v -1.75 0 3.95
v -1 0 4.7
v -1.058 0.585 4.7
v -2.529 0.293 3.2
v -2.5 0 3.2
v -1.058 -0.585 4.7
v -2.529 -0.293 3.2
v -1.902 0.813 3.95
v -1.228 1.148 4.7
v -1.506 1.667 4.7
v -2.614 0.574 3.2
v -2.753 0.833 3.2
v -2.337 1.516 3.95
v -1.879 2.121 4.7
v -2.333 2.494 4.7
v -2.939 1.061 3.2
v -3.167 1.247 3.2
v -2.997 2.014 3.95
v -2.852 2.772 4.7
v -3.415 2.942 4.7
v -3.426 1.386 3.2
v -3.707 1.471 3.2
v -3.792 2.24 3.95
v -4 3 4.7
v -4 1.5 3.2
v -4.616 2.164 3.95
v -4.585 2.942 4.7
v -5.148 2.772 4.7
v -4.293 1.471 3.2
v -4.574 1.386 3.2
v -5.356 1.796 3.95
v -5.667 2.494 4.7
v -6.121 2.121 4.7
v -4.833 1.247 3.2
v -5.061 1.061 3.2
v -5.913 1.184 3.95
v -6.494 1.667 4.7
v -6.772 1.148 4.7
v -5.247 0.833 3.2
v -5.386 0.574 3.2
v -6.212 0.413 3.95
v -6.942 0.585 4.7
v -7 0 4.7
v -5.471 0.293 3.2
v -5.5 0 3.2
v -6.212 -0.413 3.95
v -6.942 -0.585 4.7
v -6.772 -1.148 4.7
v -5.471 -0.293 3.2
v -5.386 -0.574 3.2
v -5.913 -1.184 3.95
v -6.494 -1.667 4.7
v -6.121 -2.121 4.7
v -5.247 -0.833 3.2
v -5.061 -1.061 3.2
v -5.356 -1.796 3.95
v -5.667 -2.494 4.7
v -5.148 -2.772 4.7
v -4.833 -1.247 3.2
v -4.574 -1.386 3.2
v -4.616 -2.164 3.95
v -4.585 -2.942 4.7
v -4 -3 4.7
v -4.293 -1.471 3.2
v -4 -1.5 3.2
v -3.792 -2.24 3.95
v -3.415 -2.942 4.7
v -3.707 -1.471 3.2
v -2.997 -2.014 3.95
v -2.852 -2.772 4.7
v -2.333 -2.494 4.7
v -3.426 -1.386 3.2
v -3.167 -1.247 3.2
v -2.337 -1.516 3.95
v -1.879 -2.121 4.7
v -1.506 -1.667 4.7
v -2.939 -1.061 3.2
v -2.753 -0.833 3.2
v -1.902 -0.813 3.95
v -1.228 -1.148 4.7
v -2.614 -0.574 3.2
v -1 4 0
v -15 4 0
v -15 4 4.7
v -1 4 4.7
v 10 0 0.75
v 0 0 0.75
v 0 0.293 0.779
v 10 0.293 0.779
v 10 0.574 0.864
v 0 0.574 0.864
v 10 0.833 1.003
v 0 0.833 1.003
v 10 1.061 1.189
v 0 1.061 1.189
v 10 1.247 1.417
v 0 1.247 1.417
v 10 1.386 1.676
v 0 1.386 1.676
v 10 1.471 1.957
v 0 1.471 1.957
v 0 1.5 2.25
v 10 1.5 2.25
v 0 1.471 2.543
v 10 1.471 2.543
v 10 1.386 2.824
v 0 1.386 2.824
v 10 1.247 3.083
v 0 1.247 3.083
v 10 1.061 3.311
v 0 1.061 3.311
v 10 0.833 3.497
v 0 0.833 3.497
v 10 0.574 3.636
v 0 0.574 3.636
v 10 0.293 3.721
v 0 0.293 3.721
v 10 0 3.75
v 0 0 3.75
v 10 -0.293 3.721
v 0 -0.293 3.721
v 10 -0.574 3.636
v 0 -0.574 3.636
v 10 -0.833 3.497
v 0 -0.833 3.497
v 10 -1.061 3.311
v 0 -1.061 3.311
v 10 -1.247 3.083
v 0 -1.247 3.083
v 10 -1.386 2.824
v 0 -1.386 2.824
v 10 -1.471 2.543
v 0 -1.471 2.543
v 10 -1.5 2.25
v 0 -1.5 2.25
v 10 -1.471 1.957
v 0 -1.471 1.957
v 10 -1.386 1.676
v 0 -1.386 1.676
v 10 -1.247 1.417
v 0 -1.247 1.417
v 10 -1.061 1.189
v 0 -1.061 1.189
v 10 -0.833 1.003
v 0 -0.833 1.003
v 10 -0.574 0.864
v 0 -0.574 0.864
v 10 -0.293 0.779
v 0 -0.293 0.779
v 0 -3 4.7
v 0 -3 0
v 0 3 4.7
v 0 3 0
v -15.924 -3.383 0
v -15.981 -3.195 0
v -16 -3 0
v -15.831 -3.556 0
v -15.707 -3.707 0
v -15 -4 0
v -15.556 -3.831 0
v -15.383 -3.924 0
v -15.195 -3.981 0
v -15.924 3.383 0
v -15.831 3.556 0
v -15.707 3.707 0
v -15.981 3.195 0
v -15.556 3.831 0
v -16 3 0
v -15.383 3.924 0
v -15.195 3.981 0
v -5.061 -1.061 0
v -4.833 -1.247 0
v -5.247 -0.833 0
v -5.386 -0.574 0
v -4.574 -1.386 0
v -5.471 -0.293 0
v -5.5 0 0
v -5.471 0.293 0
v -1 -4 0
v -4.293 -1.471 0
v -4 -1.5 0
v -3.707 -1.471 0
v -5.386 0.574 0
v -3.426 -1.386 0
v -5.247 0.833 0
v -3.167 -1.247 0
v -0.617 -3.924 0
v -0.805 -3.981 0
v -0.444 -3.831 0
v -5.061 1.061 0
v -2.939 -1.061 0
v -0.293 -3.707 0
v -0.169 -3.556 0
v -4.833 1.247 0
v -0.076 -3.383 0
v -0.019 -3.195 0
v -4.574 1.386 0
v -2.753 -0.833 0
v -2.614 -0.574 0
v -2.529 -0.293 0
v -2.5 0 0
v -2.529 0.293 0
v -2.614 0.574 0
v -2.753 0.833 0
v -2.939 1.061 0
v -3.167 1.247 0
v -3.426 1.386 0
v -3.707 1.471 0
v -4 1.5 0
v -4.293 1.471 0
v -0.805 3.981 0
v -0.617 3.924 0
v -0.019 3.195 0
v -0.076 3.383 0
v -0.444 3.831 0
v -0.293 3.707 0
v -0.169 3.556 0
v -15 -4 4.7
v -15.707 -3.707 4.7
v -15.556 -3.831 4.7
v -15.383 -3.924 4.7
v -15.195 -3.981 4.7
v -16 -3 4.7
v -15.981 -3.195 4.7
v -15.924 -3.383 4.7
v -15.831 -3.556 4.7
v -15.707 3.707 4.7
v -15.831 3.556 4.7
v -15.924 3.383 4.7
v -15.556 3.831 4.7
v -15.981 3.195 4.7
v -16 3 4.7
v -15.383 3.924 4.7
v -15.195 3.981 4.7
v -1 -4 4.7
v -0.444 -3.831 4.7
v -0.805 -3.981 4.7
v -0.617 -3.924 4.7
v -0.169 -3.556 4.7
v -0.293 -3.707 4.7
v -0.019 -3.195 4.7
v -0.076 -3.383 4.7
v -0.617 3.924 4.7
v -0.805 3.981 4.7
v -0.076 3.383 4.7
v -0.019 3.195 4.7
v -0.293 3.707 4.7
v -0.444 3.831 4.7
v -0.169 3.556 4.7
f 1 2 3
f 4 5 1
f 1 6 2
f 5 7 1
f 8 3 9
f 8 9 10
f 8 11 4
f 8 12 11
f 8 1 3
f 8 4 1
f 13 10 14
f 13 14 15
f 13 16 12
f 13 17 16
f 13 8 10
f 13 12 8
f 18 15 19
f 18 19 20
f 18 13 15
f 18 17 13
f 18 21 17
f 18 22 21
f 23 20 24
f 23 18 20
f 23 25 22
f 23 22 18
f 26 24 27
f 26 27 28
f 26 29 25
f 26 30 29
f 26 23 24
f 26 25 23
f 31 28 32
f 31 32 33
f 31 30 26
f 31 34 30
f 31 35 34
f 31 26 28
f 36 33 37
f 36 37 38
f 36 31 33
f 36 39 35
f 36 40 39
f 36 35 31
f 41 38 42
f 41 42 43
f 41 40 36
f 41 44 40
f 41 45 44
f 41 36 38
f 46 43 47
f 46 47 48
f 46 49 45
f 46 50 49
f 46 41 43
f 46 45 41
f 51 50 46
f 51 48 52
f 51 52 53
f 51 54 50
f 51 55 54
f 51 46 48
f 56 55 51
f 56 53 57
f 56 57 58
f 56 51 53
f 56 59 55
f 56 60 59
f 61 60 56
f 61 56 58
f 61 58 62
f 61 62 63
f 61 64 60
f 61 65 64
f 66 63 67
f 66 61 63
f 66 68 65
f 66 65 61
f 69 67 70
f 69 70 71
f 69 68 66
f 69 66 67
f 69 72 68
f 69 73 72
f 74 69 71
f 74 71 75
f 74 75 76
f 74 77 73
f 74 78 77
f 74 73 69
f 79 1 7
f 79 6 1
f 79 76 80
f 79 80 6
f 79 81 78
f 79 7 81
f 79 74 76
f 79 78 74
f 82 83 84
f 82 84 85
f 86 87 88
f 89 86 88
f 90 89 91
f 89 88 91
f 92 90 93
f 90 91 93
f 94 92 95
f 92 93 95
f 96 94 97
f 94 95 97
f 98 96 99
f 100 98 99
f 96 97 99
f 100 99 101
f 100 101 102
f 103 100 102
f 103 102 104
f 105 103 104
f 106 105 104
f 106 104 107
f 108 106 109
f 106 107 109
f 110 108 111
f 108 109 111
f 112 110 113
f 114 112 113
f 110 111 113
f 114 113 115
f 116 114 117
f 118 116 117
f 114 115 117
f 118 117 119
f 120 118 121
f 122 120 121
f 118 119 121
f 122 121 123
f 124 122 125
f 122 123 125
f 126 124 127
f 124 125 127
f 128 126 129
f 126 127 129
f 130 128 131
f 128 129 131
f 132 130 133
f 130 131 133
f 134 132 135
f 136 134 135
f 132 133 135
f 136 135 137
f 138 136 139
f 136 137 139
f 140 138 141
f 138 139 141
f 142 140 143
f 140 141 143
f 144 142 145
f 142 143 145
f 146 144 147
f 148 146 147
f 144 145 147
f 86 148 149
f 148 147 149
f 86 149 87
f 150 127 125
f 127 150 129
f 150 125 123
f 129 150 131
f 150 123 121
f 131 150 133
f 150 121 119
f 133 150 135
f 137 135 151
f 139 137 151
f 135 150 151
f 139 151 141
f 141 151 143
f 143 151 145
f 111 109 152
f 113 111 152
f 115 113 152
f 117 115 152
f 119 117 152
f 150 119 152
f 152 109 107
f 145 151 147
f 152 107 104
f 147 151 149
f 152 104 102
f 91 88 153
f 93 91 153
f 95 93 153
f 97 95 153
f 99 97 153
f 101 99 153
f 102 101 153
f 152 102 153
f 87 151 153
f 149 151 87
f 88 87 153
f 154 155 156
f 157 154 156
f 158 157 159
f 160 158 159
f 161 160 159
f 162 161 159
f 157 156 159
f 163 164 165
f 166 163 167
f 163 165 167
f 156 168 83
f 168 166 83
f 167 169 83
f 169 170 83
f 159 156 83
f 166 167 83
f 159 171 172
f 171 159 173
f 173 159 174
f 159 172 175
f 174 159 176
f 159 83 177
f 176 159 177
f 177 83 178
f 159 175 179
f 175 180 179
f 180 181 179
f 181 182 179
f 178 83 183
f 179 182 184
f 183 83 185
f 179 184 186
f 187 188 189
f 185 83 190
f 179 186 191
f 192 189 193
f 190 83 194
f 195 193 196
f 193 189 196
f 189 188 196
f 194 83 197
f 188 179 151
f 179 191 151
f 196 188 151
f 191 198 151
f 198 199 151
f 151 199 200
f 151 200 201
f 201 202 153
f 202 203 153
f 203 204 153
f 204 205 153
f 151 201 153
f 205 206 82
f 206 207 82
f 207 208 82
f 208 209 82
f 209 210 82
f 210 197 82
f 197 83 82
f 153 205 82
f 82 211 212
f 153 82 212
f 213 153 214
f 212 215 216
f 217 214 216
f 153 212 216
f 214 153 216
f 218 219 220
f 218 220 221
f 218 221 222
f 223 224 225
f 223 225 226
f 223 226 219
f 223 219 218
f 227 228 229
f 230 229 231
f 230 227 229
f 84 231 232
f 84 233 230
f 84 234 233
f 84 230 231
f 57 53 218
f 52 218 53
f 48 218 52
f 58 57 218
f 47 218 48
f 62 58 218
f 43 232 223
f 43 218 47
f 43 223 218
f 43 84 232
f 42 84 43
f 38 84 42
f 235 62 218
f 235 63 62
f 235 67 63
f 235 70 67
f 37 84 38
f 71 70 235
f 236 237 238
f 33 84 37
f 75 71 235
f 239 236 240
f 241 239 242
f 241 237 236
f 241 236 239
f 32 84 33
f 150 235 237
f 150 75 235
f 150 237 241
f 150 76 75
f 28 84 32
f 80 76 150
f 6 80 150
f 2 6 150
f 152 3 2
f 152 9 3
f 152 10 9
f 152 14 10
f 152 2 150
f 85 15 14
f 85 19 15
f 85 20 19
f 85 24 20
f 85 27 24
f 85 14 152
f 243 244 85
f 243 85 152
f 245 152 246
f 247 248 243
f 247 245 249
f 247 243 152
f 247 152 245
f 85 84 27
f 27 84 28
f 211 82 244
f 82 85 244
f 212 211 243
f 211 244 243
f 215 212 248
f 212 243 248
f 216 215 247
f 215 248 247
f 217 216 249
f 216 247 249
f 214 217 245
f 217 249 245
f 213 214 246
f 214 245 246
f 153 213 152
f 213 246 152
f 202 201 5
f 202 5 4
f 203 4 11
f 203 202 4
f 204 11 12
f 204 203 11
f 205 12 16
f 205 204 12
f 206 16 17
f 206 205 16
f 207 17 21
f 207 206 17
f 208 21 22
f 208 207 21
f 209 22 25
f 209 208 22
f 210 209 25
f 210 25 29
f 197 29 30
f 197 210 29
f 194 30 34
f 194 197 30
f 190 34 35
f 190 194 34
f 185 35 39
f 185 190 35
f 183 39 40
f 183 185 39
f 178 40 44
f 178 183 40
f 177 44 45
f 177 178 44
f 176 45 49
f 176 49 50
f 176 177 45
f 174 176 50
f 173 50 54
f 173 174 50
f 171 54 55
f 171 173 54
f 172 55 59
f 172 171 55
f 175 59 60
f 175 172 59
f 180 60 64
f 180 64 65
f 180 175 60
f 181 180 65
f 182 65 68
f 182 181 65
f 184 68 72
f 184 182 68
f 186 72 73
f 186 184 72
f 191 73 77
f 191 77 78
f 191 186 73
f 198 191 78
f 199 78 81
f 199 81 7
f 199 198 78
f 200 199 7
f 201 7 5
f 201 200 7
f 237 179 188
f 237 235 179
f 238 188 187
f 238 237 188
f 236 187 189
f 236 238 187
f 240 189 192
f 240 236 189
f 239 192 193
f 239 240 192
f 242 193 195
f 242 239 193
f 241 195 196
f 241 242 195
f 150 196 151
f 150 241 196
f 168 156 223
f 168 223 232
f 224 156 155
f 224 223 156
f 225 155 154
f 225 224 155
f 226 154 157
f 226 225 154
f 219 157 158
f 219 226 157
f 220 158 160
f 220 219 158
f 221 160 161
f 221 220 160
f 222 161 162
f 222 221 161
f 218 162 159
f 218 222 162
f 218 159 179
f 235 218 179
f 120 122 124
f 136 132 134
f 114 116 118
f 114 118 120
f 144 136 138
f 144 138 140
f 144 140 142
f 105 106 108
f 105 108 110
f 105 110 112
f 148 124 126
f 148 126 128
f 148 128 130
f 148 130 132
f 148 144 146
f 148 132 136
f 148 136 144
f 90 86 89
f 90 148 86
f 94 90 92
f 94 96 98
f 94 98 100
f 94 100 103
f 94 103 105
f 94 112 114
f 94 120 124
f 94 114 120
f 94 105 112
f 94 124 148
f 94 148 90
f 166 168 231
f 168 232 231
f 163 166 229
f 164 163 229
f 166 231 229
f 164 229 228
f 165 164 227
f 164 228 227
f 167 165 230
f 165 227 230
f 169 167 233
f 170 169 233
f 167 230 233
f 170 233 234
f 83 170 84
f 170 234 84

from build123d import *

# Parameters (mm, degrees)
SKIZZE1_W                       = 16
SKIZZE1_H                       = 8
SKIZZE1_R                       = 1.5
AUFSATZ_LINEAR_AUSTRAGEN1_DEPTH = 4.7
VERRUNDUNG1_R                   = 1
FASE1_SIZE                      = 1.5
SKIZZE2_R                       = 1.5
AUFSATZ_LINEAR_AUSTRAGEN2_DEPTH = 10


with BuildPart() as part:
    # Skizze1 → Aufsatz-Linear austragen1 (new body)
    with BuildSketch(Plane.XY):
        with Locations((-8, 0)):
            Rectangle(SKIZZE1_W, SKIZZE1_H)
        with Locations((-4, 0)):
            Circle(SKIZZE1_R, mode=Mode.SUBTRACT)
    extrude(amount=AUFSATZ_LINEAR_AUSTRAGEN1_DEPTH)

    # Verrundung1
    verrundung1_edges = [part.edges().sort_by_distance(p)[0] for p in [
        (0, -4, 2.35),
        (-16, -4, 2.35),
        (-16, 4, 2.35),
        (0, 4, 2.35),
    ]]
    fillet(verrundung1_edges, radius=VERRUNDUNG1_R)

    # Fase1
    fase1_edges = [part.edges().sort_by_distance(p)[0] for p in [
        (-5.5, 0, 4.7),
    ]]
    chamfer(fase1_edges, length=FASE1_SIZE)

    # Skizze2 → Aufsatz-Linear austragen2 (add)
    with BuildSketch(Plane(origin=(0, 0, 0), x_dir=(0, 0, -1), z_dir=(1, 0, 0))):
        with Locations((-2.25, 0)):
            Circle(SKIZZE2_R)
    extrude(amount=AUFSATZ_LINEAR_AUSTRAGEN2_DEPTH)


solid = part.part
